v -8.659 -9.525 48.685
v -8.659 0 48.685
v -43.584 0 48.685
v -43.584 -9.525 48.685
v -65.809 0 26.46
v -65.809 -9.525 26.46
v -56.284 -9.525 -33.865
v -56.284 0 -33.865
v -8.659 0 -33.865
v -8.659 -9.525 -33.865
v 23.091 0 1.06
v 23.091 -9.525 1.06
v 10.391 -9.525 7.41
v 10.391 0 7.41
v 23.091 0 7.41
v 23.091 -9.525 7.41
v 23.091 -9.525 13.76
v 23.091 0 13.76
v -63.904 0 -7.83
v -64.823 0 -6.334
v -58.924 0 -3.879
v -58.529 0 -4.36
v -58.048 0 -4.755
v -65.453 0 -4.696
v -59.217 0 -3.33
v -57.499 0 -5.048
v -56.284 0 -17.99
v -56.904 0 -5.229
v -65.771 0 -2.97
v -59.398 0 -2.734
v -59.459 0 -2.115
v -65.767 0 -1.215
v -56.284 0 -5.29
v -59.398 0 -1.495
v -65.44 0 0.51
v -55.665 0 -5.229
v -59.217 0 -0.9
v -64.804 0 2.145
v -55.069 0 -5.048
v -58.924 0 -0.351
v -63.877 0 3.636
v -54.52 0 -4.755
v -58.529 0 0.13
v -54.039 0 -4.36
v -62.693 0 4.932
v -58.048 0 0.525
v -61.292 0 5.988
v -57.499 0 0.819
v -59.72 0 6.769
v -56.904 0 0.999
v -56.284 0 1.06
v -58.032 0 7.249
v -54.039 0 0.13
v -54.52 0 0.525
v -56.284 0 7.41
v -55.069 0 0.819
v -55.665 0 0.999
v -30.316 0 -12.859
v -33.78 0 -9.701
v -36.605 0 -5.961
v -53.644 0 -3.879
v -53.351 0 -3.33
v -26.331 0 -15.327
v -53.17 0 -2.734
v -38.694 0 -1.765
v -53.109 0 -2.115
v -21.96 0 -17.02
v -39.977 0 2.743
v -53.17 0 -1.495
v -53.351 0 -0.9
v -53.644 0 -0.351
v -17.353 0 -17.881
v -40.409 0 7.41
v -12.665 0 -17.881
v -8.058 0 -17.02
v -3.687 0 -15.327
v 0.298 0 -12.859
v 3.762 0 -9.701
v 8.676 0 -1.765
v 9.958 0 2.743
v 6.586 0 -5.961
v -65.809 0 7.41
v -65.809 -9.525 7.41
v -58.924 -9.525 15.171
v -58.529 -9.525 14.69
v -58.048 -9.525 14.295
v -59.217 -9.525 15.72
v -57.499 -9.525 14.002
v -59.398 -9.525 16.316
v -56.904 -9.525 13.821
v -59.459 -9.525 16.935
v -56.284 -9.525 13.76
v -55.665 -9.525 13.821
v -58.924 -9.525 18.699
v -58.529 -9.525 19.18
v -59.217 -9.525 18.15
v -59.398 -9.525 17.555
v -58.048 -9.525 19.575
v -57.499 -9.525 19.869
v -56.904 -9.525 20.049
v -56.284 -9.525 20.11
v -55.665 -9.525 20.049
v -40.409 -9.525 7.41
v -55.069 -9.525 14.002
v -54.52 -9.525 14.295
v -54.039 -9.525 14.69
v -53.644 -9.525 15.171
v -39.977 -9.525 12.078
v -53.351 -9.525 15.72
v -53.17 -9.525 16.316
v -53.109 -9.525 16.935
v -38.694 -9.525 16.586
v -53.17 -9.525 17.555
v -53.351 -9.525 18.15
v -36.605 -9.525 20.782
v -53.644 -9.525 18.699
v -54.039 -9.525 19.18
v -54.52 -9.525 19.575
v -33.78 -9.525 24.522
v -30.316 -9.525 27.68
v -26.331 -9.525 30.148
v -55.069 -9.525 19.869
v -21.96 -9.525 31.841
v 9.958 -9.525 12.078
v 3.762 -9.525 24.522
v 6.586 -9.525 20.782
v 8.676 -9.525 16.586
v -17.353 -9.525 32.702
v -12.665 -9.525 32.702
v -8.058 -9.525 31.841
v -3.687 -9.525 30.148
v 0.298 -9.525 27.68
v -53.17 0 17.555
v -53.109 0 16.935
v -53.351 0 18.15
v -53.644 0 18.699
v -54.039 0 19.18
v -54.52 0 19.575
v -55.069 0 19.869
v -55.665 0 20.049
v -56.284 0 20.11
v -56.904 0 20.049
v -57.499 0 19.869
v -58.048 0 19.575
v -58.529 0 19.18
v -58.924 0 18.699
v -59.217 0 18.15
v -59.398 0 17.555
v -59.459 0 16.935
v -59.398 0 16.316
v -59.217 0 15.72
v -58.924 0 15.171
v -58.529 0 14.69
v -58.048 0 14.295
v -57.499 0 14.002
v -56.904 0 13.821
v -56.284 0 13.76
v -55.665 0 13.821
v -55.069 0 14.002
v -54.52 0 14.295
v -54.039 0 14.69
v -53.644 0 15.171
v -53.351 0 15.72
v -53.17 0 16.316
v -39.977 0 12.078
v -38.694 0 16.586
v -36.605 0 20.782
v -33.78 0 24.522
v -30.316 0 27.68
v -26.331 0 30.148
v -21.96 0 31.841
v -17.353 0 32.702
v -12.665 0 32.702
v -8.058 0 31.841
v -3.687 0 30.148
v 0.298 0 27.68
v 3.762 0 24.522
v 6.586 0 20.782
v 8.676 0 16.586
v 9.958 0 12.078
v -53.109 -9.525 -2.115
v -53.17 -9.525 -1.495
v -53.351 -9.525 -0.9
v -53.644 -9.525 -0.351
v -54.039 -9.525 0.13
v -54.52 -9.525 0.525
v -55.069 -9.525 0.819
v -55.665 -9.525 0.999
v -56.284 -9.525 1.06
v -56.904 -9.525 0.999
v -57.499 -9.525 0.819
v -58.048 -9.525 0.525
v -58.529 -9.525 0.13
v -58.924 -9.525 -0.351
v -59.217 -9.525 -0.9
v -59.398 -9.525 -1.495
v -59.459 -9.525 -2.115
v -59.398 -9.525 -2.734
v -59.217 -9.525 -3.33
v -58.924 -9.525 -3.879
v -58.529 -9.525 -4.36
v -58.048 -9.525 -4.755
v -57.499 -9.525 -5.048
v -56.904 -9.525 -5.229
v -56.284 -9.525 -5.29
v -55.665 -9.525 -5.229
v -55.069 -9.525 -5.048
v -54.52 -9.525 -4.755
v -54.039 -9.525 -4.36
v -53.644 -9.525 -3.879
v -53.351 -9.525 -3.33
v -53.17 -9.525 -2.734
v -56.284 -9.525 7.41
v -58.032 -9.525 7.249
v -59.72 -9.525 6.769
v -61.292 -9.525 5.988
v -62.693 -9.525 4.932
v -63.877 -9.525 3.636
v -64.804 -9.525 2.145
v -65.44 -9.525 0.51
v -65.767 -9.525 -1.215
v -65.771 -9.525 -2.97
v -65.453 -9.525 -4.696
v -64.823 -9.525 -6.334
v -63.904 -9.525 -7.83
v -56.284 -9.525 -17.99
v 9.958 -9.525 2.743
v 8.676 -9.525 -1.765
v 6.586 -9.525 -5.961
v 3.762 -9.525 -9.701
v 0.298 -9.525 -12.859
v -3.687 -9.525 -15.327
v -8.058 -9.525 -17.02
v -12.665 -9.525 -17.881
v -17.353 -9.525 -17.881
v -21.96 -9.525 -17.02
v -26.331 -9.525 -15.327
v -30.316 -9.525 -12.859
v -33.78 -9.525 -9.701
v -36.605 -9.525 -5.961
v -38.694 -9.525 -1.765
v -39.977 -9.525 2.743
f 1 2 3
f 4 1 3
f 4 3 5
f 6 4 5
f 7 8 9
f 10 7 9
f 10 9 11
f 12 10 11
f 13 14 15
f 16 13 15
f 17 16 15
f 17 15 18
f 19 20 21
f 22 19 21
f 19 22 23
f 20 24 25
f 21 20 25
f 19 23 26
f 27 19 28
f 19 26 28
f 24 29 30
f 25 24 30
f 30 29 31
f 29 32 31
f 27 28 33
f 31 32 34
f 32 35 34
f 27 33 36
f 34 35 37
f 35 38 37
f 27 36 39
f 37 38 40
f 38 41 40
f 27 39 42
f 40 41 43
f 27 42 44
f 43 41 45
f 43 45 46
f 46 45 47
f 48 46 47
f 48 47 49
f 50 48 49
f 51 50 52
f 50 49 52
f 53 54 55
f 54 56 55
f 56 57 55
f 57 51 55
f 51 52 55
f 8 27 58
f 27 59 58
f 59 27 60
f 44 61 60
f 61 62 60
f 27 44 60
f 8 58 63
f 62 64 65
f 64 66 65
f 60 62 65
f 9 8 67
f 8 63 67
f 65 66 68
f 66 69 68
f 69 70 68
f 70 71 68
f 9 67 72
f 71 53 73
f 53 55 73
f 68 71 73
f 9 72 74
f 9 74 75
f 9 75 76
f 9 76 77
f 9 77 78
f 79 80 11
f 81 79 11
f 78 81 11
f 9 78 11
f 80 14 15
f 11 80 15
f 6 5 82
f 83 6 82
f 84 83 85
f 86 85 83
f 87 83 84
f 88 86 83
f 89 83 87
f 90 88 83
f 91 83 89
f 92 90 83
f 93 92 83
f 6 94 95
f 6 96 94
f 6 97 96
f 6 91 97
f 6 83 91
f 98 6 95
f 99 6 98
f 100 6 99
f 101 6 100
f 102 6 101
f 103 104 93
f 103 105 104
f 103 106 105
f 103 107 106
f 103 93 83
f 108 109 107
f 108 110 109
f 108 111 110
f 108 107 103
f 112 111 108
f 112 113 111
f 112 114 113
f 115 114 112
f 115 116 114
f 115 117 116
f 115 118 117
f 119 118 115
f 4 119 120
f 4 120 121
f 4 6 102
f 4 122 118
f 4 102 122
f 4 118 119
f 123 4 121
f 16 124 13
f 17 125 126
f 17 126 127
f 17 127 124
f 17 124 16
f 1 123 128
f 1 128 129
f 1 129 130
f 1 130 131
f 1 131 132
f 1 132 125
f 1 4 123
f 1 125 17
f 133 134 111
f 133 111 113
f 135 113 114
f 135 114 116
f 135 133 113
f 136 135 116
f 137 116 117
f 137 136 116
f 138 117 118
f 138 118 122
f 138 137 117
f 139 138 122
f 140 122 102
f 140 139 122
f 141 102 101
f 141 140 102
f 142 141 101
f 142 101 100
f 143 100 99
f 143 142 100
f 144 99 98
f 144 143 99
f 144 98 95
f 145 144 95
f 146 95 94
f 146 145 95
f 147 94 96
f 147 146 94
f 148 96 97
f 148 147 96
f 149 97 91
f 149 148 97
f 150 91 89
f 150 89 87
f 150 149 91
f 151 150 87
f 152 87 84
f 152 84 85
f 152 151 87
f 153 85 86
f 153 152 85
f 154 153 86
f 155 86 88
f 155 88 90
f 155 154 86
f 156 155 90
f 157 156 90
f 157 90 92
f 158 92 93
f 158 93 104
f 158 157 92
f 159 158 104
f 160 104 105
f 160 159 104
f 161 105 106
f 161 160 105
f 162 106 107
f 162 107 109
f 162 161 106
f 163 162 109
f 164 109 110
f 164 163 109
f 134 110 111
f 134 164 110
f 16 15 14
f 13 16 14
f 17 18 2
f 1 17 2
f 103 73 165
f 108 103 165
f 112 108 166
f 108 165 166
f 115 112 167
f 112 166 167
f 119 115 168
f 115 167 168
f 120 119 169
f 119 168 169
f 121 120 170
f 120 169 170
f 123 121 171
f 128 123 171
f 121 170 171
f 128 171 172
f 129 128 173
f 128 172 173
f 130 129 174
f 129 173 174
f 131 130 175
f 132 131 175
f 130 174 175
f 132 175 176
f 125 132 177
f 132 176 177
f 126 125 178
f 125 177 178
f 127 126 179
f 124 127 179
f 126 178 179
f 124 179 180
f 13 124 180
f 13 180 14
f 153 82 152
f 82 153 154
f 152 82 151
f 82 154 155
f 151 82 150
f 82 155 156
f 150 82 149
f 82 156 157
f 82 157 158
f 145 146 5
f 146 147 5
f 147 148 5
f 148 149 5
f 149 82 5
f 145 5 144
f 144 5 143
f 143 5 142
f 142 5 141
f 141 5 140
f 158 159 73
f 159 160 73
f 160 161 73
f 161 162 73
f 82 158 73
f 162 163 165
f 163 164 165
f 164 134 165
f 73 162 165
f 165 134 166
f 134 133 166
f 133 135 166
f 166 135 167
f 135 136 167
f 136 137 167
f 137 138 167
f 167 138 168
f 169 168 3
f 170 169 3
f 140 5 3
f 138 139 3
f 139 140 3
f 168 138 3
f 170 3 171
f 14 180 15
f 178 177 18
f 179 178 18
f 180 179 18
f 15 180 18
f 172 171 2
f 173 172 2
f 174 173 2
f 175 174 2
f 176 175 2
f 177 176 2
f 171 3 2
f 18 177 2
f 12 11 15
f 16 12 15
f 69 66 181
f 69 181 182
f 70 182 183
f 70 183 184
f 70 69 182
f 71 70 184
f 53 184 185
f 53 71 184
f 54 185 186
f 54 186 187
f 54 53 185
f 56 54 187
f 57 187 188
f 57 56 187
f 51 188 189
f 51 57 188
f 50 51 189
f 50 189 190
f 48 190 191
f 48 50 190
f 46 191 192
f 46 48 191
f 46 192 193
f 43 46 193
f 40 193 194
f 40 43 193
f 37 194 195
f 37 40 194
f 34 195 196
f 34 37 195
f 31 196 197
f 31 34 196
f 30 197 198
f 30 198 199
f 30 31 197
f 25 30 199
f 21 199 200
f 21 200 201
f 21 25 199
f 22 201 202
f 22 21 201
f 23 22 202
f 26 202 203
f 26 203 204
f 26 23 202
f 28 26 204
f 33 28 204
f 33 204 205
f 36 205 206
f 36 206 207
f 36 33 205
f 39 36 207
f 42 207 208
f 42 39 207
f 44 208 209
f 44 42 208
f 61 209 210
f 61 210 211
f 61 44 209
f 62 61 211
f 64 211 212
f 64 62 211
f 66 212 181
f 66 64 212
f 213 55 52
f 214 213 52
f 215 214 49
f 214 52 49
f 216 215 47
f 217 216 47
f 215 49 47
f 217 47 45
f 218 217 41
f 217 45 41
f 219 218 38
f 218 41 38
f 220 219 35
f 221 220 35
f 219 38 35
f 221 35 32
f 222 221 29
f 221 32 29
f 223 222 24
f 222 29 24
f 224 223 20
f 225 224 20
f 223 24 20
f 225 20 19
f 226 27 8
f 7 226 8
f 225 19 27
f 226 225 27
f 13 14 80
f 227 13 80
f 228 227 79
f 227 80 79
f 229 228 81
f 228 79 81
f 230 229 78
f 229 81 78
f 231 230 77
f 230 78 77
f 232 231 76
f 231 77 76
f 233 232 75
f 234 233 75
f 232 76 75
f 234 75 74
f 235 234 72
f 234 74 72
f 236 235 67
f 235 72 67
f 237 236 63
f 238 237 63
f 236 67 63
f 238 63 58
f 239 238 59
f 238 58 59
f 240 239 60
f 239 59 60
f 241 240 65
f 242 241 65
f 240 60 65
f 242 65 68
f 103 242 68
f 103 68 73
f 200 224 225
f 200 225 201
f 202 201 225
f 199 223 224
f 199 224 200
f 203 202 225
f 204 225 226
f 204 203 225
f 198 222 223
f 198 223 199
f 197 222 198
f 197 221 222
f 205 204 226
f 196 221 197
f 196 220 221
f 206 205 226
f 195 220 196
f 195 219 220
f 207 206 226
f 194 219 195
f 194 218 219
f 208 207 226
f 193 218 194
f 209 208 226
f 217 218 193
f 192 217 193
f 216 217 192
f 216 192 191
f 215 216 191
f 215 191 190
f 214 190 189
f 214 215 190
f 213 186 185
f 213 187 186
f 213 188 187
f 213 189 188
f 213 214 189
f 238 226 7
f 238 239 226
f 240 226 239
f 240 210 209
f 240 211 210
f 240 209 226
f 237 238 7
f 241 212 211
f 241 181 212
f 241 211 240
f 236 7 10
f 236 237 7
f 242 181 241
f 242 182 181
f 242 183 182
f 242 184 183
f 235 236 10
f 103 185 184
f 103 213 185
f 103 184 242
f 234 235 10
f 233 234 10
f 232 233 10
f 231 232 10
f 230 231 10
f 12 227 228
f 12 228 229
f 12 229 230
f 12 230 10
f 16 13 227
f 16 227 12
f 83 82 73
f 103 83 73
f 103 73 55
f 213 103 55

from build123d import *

# Parameters (mm, degrees)
F0_R     = 3.175
F1_DEPTH = 9.525
F2_DEPTH = 9.525


with BuildPart() as f1:
    # F0 (on Front) → F1 (new body)
    with BuildSketch(Plane.XZ):
        with BuildLine():
            Line((10.390909, 7.410393), (23.090909, 7.410393))
            Line((23.090909, 7.410393), (23.090909, 13.760393))
            Line((23.090909, 13.760393), (-8.659091, 48.685393))
            Line((-8.659091, 48.685393), (-43.584091, 48.685393))
            Line((-43.584091, 48.685393), (-65.809091, 26.460393))
            Line((-65.809091, 26.460393), (-65.809091, 7.410393))
            Line((-65.809091, 7.410393), (-56.284091, 7.410393))
            Line((-56.284091, 7.410393), (-40.409091, 7.410393))
            ThreePointArc((-40.409091, 7.410393), (-15.009091, 32.810393), (10.390909, 7.410393))
        make_face()
        with Locations((-56.284091, 16.935393)):
            Circle(F0_R, mode=Mode.SUBTRACT)
    extrude(amount=F1_DEPTH)


with BuildPart() as f2:
    # F0 (on Front) → F2 (new body)
    with BuildSketch(Plane.XZ):
        with BuildLine():
            Line((-56.284091, -17.989607), (-56.284091, -33.864607))
            Line((-56.284091, -33.864607), (-8.659091, -33.864607))
            Line((-8.659091, -33.864607), (23.090909, 1.060393))
            Line((23.090909, 1.060393), (23.090909, 7.410393))
            Line((23.090909, 7.410393), (10.390909, 7.410393))
            ThreePointArc((10.390909, 7.410393), (-15.009091, -17.989607), (-40.409091, 7.410393))
            Line((-40.409091, 7.410393), (-56.284091, 7.410393))
            ThreePointArc((-56.284091, 7.410393), (-64.80351, 2.145103), (-63.904091, -7.829607))
            Line((-63.904091, -7.829607), (-56.284091, -17.989607))
        make_face()
        with Locations((-56.284091, -2.114607)):
            Circle(F0_R, mode=Mode.SUBTRACT)
    extrude(amount=F2_DEPTH)


solid = Compound([f1.part, f2.part])
